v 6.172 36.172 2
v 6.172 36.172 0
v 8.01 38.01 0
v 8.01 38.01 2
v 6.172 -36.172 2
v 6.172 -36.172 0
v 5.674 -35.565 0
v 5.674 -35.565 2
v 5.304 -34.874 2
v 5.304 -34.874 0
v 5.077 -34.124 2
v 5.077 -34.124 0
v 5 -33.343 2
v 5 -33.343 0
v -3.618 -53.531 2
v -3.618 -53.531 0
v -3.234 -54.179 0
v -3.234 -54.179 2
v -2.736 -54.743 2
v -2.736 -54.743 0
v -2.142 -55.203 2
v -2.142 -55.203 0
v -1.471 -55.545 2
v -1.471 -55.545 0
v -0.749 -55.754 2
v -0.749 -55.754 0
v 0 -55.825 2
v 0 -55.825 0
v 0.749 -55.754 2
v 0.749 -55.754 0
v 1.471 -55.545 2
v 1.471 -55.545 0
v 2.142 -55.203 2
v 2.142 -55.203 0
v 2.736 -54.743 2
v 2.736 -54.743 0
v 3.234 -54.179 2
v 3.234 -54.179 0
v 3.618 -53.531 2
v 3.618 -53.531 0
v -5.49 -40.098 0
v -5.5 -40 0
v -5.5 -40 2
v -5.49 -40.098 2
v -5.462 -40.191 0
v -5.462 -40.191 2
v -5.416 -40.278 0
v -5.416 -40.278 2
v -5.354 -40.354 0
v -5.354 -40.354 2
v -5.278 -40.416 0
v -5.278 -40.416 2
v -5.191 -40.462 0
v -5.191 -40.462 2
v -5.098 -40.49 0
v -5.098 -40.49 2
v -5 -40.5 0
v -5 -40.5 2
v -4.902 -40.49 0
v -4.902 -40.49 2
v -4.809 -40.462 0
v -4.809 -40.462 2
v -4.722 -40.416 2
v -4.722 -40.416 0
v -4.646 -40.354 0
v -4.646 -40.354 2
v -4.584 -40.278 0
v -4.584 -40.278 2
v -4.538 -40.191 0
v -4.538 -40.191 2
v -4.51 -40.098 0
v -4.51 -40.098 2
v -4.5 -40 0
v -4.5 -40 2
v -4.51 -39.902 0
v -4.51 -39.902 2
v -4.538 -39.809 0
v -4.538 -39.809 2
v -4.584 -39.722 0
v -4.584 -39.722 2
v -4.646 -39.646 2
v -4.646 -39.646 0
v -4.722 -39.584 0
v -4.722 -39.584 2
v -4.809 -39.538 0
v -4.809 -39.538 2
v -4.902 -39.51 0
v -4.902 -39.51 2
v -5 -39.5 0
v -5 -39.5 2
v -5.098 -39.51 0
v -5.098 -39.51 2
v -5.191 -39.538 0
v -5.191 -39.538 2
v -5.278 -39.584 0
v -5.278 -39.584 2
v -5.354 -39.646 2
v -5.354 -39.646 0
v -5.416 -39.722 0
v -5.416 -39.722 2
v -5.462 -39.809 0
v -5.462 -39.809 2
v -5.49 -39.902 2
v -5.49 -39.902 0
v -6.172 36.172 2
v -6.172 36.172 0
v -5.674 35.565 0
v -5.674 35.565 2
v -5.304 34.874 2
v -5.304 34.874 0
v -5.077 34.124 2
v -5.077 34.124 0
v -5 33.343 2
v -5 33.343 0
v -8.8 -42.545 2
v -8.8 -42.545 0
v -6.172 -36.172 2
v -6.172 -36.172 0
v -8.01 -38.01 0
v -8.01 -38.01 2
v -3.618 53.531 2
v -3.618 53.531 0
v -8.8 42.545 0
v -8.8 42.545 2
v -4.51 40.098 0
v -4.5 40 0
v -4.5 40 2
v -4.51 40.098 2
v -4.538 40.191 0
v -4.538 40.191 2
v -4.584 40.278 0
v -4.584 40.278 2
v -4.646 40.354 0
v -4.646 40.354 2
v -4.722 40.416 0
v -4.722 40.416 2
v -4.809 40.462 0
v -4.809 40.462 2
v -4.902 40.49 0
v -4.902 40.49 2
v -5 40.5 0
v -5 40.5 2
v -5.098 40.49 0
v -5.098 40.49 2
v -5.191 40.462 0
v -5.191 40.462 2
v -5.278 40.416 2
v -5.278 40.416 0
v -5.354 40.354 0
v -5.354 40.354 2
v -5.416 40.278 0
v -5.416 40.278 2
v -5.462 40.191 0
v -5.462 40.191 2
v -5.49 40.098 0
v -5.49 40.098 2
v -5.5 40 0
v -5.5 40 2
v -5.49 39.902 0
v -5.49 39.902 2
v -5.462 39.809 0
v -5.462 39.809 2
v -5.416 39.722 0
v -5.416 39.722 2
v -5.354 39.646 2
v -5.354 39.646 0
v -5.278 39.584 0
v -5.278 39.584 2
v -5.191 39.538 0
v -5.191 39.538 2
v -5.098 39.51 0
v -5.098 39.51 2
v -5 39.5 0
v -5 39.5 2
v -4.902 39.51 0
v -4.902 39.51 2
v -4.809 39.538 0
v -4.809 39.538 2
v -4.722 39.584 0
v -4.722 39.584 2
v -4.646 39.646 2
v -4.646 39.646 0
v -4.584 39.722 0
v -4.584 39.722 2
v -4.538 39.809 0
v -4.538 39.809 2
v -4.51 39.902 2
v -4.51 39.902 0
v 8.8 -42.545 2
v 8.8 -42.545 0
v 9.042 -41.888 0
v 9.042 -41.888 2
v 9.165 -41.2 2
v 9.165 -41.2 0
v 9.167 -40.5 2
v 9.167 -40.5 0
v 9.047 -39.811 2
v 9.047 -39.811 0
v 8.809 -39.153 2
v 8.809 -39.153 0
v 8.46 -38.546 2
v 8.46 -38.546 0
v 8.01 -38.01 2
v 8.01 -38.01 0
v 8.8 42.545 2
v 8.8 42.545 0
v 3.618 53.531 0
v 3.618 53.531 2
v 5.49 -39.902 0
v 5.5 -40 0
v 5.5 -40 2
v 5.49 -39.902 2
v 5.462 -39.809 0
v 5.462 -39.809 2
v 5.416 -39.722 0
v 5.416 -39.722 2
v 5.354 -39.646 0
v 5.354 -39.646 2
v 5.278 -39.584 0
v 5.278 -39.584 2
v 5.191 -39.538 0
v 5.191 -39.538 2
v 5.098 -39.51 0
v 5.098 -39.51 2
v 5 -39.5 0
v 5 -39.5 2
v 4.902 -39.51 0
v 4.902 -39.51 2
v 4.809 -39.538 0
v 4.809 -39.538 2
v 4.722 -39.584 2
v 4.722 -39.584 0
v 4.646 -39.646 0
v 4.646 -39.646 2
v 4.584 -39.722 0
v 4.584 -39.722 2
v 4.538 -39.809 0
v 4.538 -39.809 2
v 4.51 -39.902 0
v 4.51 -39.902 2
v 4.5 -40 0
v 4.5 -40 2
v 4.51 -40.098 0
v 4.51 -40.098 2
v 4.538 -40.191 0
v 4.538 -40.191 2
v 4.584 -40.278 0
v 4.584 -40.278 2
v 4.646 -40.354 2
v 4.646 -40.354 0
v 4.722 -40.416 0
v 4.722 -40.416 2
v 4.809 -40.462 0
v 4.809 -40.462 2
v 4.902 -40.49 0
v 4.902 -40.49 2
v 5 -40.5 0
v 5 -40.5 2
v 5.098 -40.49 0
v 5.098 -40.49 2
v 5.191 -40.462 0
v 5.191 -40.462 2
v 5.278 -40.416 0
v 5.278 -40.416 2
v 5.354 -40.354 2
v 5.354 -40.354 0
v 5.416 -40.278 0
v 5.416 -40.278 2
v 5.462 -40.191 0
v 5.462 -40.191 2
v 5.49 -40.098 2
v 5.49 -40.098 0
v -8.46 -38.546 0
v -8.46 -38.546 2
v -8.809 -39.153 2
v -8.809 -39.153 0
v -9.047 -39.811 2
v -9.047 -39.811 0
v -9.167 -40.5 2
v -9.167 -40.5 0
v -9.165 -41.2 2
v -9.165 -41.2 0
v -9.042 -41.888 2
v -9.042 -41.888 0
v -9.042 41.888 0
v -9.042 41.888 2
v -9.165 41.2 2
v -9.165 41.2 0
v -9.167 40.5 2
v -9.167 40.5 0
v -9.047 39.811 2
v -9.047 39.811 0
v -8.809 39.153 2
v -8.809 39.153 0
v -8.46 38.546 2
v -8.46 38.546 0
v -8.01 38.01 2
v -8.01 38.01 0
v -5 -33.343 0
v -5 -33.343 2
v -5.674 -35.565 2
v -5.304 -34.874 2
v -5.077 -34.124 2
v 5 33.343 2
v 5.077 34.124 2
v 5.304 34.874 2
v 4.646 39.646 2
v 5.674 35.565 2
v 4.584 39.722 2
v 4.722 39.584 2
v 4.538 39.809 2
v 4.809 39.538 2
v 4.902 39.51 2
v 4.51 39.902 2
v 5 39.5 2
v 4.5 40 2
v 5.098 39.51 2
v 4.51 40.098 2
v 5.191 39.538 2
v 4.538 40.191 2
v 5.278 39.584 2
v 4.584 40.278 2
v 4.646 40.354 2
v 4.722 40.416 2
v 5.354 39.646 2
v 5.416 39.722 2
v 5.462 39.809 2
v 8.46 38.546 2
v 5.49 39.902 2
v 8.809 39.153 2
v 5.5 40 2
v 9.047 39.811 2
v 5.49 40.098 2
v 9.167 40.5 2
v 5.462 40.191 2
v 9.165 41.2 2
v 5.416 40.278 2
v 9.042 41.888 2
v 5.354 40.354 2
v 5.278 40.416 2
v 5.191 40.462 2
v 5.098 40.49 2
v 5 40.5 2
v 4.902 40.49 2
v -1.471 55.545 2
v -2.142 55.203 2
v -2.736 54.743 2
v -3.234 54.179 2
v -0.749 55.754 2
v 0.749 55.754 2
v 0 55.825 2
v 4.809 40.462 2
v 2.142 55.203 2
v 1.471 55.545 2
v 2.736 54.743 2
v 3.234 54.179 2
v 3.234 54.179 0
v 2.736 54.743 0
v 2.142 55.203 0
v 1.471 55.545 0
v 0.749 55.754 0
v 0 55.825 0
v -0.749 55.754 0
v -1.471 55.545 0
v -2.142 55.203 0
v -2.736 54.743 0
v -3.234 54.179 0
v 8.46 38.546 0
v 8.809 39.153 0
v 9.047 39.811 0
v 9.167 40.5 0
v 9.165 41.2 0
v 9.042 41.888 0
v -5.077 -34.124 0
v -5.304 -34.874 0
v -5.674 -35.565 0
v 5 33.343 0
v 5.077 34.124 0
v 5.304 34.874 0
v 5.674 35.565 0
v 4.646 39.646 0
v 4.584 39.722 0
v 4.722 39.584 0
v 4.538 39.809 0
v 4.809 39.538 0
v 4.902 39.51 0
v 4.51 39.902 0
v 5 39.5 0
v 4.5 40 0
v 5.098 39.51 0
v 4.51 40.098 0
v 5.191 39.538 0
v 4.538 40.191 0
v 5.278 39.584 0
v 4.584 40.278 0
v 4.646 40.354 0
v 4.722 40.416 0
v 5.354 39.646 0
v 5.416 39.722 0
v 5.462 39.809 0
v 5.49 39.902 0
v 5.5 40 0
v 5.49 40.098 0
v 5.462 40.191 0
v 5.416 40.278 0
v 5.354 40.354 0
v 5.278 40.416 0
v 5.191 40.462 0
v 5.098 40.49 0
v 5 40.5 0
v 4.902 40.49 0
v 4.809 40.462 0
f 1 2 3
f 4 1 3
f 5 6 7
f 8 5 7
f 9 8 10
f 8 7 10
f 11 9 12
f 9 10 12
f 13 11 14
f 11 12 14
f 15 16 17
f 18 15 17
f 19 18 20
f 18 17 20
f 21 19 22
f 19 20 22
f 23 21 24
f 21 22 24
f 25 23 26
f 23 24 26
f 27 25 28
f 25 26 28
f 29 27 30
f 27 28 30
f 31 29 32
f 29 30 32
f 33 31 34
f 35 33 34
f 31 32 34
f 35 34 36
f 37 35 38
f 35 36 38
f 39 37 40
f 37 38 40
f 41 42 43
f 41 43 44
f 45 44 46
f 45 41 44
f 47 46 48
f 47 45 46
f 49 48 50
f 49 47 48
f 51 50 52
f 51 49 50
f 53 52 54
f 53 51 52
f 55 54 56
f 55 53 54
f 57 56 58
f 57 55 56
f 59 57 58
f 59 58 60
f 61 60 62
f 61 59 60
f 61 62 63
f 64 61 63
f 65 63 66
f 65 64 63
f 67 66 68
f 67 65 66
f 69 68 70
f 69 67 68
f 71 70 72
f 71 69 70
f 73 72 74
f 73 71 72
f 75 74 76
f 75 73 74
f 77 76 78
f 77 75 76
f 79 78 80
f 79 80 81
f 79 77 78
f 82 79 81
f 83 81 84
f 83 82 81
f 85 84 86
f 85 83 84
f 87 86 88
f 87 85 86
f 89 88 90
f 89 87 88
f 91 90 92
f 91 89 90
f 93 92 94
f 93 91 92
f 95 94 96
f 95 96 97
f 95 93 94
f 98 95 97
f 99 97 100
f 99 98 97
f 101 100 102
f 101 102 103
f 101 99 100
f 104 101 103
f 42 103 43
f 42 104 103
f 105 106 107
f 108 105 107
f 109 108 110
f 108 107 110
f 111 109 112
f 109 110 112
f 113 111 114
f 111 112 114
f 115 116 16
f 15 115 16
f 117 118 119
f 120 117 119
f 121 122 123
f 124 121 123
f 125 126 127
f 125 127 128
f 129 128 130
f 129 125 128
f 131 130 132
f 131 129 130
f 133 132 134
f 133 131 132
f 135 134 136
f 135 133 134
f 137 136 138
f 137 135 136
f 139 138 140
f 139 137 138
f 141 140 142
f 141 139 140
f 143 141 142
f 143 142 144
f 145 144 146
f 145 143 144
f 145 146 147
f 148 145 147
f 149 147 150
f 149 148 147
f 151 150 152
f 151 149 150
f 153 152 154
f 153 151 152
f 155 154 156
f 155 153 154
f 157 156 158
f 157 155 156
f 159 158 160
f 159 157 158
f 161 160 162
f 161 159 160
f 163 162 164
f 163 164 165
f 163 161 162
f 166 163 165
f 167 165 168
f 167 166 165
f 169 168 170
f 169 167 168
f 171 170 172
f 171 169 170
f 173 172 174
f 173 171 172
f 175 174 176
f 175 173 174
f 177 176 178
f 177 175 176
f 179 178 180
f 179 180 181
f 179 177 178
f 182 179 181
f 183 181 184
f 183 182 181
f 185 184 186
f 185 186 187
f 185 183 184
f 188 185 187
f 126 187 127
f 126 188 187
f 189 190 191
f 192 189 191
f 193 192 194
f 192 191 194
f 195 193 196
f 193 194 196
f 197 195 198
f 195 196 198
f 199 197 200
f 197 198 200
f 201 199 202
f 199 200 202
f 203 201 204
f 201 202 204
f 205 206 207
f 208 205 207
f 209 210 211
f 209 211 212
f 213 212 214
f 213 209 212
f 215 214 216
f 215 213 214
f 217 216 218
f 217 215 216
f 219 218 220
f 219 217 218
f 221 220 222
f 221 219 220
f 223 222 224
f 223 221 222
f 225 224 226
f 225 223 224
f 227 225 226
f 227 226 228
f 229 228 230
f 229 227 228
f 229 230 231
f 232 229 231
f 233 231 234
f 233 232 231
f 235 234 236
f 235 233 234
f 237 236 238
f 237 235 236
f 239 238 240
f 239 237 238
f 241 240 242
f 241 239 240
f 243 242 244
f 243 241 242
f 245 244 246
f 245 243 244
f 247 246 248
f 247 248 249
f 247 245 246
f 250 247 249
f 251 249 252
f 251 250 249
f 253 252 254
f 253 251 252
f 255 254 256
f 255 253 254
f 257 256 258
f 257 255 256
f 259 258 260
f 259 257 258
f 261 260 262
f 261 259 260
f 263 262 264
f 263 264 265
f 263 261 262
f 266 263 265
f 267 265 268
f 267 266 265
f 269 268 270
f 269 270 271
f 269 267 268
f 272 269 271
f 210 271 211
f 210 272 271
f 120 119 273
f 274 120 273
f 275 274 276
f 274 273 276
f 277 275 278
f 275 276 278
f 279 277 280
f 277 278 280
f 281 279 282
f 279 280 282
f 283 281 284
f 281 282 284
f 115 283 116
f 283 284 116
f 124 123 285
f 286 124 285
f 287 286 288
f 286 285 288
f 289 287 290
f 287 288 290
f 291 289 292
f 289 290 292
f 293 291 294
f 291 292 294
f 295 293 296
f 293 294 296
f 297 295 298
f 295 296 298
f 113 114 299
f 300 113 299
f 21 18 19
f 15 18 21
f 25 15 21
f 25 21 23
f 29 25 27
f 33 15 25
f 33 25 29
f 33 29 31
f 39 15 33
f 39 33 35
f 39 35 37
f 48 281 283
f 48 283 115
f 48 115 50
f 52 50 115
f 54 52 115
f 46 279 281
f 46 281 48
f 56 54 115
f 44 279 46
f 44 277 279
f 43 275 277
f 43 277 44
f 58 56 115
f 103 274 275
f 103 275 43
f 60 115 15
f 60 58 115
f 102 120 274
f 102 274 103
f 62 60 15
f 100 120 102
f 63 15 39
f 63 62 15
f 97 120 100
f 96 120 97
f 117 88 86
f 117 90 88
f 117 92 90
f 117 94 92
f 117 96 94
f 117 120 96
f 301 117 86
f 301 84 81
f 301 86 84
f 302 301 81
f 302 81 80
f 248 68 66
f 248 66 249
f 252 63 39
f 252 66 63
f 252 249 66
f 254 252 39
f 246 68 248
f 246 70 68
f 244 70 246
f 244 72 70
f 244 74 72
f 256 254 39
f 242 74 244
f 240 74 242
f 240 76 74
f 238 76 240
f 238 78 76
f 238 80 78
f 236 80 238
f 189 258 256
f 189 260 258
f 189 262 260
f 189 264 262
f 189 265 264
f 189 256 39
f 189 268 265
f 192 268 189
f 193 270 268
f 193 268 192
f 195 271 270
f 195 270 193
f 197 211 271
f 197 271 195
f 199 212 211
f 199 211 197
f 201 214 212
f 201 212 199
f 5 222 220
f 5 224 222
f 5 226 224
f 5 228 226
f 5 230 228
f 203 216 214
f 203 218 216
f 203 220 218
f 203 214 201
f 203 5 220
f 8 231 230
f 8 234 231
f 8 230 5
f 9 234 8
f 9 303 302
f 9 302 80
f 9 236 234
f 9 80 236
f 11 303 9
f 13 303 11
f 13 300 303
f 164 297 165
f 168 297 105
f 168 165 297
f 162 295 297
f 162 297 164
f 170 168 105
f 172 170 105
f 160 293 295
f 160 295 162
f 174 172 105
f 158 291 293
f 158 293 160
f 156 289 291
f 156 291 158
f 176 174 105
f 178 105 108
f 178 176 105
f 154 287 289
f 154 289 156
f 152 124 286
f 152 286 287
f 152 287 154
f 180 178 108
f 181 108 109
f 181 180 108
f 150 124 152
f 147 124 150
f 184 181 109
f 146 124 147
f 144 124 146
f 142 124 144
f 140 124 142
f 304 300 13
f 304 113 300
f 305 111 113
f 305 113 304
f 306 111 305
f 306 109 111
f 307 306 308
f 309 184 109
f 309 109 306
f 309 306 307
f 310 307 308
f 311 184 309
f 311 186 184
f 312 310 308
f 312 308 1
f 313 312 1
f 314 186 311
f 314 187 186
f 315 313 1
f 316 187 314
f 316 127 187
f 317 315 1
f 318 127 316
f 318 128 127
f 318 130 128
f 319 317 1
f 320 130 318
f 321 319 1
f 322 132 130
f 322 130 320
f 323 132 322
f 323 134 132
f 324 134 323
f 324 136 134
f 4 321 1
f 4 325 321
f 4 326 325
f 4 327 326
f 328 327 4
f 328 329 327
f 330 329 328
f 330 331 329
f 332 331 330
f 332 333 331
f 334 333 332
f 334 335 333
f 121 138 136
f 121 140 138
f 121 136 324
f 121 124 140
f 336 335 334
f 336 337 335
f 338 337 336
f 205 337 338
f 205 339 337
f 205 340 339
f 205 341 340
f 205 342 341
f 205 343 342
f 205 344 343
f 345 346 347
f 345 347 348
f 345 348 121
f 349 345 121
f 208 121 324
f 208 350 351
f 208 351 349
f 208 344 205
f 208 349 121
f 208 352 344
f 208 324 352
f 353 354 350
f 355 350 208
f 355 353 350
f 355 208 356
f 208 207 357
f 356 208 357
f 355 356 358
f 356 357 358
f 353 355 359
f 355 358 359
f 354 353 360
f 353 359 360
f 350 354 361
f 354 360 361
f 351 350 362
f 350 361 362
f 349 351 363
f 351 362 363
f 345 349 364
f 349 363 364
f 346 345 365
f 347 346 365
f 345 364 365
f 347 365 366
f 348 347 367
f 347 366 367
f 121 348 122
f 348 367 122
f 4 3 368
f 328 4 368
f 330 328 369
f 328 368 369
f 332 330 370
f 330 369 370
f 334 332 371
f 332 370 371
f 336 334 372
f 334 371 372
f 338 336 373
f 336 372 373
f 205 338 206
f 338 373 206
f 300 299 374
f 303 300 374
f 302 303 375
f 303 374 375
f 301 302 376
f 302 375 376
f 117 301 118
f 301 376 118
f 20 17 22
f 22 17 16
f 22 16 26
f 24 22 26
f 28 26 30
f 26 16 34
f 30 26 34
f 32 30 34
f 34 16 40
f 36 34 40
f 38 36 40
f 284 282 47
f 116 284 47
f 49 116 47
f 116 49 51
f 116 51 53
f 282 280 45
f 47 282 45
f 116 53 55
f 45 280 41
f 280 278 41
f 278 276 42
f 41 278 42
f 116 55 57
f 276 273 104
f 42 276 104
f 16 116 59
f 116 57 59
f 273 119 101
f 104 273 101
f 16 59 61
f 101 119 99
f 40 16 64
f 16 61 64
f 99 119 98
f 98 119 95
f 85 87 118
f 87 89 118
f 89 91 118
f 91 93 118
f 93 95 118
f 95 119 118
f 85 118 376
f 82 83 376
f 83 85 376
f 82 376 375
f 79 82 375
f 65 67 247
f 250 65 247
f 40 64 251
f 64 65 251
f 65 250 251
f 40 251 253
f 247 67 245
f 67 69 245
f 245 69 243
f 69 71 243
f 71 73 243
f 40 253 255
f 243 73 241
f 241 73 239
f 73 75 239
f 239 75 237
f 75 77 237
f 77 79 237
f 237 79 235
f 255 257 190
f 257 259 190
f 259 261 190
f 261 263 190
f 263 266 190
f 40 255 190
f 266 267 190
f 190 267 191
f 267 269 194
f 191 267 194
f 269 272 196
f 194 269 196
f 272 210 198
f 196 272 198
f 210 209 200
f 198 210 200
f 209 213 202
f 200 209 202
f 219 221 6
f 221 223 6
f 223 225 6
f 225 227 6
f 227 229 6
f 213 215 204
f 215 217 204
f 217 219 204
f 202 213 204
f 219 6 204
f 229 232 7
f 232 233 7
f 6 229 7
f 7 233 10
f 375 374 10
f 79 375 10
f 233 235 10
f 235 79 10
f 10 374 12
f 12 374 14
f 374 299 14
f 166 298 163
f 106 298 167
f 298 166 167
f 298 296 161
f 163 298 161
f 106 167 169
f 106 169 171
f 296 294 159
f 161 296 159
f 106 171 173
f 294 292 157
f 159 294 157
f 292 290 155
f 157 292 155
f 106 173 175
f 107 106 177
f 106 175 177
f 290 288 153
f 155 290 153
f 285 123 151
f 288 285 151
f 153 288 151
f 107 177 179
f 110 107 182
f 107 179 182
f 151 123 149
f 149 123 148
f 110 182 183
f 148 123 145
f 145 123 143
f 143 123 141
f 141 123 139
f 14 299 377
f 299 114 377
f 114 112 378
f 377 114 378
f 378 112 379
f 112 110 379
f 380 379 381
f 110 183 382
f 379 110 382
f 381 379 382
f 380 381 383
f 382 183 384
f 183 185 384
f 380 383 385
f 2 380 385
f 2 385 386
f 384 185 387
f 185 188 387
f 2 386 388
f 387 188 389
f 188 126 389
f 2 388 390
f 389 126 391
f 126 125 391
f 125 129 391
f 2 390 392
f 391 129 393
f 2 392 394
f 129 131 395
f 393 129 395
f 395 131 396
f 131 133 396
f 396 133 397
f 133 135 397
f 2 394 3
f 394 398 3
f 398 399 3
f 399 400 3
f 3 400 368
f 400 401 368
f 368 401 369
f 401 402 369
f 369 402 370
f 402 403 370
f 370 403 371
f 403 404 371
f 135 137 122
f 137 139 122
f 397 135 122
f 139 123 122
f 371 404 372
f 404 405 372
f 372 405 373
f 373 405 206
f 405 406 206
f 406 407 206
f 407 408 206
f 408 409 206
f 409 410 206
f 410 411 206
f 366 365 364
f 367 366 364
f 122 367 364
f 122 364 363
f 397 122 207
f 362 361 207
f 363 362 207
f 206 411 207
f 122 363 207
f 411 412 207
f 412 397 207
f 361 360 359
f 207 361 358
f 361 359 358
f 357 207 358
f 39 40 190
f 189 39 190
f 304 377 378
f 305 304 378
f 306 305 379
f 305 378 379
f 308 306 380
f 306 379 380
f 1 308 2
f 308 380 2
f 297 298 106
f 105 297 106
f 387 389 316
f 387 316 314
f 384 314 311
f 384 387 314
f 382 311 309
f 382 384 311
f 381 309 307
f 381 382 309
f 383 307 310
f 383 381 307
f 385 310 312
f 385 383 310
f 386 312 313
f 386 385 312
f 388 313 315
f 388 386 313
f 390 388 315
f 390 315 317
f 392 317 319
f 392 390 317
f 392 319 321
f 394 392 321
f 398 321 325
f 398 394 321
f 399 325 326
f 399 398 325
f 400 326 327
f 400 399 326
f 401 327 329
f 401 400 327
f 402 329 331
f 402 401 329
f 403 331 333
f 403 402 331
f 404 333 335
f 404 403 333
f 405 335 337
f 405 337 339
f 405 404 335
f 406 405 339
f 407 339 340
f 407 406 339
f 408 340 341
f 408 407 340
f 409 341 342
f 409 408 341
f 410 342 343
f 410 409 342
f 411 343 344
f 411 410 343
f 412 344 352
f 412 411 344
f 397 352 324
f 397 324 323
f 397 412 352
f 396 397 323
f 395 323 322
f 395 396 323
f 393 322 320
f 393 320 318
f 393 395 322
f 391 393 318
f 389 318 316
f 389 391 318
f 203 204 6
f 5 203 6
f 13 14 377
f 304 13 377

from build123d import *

# Parameters (mm, degrees)
SKETCH1_R           = 0.5
BOSS_EXTRUDE1_DEPTH = 2


with BuildPart() as part:
    # Sketch1 → Boss-Extrude1 (new body)
    with BuildSketch(Plane.XY):
        with BuildLine():
            Line((-3.617777686, 53.531365908), (-8.799601245, 42.545043716))
            ThreePointArc((-8.799601245, 42.545043716), (-9.122569183, 40.152730346), (-8.010250683, 38.010250683))
            Line((-8.010250683, 38.010250683), (-6.171572875, 36.171572875))
            ThreePointArc((-6.171572875, 36.171572875), (-5.30448187, 34.87387948), (-5, 33.343145751))
            Line((-5, 33.343145751), (-5, -33.343145751))
            ThreePointArc((-5, -33.343145751), (-5.30448187, -34.87387948), (-6.171572875, -36.171572875))
            Line((-6.171572875, -36.171572875), (-8.010250683, -38.010250683))
            ThreePointArc((-8.010250683, -38.010250683), (-9.122569183, -40.152730346), (-8.799601245, -42.545043716))
            Line((-8.799601245, -42.545043716), (-3.617777686, -53.531365908))
            ThreePointArc((-3.617777686, -53.531365908), (0, -55.825), (3.617777686, -53.531365908))
            Line((3.617777686, -53.531365908), (8.799601245, -42.545043716))
            ThreePointArc((8.799601245, -42.545043716), (9.122569183, -40.152730346), (8.010250683, -38.010250683))
            Line((8.010250683, -38.010250683), (6.171572875, -36.171572875))
            ThreePointArc((6.171572875, -36.171572875), (5.30448187, -34.87387948), (5, -33.343145751))
            Line((5, -33.343145751), (5, 33.343145751))
            ThreePointArc((5, 33.343145751), (5.30448187, 34.87387948), (6.171572875, 36.171572875))
            Line((6.171572875, 36.171572875), (8.010250683, 38.010250683))
            ThreePointArc((8.010250683, 38.010250683), (9.122569183, 40.152730346), (8.799601245, 42.545043716))
            Line((8.799601245, 42.545043716), (3.617777686, 53.531365908))
            ThreePointArc((3.617777686, 53.531365908), (0, 55.825), (-3.617777686, 53.531365908))
        make_face()
        with Locations((-5, 40)):
            Circle(SKETCH1_R, mode=Mode.SUBTRACT)
        with Locations(Location((5, 40, 0), (0, 0, 180))):
            Circle(SKETCH1_R, mode=Mode.SUBTRACT)
        with Locations((5, -40)):
            Circle(SKETCH1_R, mode=Mode.SUBTRACT)
        with Locations(Location((-5, -40, 0), (0, 0, 180))):
            Circle(SKETCH1_R, mode=Mode.SUBTRACT)
    extrude(amount=BOSS_EXTRUDE1_DEPTH)


solid = part.part
